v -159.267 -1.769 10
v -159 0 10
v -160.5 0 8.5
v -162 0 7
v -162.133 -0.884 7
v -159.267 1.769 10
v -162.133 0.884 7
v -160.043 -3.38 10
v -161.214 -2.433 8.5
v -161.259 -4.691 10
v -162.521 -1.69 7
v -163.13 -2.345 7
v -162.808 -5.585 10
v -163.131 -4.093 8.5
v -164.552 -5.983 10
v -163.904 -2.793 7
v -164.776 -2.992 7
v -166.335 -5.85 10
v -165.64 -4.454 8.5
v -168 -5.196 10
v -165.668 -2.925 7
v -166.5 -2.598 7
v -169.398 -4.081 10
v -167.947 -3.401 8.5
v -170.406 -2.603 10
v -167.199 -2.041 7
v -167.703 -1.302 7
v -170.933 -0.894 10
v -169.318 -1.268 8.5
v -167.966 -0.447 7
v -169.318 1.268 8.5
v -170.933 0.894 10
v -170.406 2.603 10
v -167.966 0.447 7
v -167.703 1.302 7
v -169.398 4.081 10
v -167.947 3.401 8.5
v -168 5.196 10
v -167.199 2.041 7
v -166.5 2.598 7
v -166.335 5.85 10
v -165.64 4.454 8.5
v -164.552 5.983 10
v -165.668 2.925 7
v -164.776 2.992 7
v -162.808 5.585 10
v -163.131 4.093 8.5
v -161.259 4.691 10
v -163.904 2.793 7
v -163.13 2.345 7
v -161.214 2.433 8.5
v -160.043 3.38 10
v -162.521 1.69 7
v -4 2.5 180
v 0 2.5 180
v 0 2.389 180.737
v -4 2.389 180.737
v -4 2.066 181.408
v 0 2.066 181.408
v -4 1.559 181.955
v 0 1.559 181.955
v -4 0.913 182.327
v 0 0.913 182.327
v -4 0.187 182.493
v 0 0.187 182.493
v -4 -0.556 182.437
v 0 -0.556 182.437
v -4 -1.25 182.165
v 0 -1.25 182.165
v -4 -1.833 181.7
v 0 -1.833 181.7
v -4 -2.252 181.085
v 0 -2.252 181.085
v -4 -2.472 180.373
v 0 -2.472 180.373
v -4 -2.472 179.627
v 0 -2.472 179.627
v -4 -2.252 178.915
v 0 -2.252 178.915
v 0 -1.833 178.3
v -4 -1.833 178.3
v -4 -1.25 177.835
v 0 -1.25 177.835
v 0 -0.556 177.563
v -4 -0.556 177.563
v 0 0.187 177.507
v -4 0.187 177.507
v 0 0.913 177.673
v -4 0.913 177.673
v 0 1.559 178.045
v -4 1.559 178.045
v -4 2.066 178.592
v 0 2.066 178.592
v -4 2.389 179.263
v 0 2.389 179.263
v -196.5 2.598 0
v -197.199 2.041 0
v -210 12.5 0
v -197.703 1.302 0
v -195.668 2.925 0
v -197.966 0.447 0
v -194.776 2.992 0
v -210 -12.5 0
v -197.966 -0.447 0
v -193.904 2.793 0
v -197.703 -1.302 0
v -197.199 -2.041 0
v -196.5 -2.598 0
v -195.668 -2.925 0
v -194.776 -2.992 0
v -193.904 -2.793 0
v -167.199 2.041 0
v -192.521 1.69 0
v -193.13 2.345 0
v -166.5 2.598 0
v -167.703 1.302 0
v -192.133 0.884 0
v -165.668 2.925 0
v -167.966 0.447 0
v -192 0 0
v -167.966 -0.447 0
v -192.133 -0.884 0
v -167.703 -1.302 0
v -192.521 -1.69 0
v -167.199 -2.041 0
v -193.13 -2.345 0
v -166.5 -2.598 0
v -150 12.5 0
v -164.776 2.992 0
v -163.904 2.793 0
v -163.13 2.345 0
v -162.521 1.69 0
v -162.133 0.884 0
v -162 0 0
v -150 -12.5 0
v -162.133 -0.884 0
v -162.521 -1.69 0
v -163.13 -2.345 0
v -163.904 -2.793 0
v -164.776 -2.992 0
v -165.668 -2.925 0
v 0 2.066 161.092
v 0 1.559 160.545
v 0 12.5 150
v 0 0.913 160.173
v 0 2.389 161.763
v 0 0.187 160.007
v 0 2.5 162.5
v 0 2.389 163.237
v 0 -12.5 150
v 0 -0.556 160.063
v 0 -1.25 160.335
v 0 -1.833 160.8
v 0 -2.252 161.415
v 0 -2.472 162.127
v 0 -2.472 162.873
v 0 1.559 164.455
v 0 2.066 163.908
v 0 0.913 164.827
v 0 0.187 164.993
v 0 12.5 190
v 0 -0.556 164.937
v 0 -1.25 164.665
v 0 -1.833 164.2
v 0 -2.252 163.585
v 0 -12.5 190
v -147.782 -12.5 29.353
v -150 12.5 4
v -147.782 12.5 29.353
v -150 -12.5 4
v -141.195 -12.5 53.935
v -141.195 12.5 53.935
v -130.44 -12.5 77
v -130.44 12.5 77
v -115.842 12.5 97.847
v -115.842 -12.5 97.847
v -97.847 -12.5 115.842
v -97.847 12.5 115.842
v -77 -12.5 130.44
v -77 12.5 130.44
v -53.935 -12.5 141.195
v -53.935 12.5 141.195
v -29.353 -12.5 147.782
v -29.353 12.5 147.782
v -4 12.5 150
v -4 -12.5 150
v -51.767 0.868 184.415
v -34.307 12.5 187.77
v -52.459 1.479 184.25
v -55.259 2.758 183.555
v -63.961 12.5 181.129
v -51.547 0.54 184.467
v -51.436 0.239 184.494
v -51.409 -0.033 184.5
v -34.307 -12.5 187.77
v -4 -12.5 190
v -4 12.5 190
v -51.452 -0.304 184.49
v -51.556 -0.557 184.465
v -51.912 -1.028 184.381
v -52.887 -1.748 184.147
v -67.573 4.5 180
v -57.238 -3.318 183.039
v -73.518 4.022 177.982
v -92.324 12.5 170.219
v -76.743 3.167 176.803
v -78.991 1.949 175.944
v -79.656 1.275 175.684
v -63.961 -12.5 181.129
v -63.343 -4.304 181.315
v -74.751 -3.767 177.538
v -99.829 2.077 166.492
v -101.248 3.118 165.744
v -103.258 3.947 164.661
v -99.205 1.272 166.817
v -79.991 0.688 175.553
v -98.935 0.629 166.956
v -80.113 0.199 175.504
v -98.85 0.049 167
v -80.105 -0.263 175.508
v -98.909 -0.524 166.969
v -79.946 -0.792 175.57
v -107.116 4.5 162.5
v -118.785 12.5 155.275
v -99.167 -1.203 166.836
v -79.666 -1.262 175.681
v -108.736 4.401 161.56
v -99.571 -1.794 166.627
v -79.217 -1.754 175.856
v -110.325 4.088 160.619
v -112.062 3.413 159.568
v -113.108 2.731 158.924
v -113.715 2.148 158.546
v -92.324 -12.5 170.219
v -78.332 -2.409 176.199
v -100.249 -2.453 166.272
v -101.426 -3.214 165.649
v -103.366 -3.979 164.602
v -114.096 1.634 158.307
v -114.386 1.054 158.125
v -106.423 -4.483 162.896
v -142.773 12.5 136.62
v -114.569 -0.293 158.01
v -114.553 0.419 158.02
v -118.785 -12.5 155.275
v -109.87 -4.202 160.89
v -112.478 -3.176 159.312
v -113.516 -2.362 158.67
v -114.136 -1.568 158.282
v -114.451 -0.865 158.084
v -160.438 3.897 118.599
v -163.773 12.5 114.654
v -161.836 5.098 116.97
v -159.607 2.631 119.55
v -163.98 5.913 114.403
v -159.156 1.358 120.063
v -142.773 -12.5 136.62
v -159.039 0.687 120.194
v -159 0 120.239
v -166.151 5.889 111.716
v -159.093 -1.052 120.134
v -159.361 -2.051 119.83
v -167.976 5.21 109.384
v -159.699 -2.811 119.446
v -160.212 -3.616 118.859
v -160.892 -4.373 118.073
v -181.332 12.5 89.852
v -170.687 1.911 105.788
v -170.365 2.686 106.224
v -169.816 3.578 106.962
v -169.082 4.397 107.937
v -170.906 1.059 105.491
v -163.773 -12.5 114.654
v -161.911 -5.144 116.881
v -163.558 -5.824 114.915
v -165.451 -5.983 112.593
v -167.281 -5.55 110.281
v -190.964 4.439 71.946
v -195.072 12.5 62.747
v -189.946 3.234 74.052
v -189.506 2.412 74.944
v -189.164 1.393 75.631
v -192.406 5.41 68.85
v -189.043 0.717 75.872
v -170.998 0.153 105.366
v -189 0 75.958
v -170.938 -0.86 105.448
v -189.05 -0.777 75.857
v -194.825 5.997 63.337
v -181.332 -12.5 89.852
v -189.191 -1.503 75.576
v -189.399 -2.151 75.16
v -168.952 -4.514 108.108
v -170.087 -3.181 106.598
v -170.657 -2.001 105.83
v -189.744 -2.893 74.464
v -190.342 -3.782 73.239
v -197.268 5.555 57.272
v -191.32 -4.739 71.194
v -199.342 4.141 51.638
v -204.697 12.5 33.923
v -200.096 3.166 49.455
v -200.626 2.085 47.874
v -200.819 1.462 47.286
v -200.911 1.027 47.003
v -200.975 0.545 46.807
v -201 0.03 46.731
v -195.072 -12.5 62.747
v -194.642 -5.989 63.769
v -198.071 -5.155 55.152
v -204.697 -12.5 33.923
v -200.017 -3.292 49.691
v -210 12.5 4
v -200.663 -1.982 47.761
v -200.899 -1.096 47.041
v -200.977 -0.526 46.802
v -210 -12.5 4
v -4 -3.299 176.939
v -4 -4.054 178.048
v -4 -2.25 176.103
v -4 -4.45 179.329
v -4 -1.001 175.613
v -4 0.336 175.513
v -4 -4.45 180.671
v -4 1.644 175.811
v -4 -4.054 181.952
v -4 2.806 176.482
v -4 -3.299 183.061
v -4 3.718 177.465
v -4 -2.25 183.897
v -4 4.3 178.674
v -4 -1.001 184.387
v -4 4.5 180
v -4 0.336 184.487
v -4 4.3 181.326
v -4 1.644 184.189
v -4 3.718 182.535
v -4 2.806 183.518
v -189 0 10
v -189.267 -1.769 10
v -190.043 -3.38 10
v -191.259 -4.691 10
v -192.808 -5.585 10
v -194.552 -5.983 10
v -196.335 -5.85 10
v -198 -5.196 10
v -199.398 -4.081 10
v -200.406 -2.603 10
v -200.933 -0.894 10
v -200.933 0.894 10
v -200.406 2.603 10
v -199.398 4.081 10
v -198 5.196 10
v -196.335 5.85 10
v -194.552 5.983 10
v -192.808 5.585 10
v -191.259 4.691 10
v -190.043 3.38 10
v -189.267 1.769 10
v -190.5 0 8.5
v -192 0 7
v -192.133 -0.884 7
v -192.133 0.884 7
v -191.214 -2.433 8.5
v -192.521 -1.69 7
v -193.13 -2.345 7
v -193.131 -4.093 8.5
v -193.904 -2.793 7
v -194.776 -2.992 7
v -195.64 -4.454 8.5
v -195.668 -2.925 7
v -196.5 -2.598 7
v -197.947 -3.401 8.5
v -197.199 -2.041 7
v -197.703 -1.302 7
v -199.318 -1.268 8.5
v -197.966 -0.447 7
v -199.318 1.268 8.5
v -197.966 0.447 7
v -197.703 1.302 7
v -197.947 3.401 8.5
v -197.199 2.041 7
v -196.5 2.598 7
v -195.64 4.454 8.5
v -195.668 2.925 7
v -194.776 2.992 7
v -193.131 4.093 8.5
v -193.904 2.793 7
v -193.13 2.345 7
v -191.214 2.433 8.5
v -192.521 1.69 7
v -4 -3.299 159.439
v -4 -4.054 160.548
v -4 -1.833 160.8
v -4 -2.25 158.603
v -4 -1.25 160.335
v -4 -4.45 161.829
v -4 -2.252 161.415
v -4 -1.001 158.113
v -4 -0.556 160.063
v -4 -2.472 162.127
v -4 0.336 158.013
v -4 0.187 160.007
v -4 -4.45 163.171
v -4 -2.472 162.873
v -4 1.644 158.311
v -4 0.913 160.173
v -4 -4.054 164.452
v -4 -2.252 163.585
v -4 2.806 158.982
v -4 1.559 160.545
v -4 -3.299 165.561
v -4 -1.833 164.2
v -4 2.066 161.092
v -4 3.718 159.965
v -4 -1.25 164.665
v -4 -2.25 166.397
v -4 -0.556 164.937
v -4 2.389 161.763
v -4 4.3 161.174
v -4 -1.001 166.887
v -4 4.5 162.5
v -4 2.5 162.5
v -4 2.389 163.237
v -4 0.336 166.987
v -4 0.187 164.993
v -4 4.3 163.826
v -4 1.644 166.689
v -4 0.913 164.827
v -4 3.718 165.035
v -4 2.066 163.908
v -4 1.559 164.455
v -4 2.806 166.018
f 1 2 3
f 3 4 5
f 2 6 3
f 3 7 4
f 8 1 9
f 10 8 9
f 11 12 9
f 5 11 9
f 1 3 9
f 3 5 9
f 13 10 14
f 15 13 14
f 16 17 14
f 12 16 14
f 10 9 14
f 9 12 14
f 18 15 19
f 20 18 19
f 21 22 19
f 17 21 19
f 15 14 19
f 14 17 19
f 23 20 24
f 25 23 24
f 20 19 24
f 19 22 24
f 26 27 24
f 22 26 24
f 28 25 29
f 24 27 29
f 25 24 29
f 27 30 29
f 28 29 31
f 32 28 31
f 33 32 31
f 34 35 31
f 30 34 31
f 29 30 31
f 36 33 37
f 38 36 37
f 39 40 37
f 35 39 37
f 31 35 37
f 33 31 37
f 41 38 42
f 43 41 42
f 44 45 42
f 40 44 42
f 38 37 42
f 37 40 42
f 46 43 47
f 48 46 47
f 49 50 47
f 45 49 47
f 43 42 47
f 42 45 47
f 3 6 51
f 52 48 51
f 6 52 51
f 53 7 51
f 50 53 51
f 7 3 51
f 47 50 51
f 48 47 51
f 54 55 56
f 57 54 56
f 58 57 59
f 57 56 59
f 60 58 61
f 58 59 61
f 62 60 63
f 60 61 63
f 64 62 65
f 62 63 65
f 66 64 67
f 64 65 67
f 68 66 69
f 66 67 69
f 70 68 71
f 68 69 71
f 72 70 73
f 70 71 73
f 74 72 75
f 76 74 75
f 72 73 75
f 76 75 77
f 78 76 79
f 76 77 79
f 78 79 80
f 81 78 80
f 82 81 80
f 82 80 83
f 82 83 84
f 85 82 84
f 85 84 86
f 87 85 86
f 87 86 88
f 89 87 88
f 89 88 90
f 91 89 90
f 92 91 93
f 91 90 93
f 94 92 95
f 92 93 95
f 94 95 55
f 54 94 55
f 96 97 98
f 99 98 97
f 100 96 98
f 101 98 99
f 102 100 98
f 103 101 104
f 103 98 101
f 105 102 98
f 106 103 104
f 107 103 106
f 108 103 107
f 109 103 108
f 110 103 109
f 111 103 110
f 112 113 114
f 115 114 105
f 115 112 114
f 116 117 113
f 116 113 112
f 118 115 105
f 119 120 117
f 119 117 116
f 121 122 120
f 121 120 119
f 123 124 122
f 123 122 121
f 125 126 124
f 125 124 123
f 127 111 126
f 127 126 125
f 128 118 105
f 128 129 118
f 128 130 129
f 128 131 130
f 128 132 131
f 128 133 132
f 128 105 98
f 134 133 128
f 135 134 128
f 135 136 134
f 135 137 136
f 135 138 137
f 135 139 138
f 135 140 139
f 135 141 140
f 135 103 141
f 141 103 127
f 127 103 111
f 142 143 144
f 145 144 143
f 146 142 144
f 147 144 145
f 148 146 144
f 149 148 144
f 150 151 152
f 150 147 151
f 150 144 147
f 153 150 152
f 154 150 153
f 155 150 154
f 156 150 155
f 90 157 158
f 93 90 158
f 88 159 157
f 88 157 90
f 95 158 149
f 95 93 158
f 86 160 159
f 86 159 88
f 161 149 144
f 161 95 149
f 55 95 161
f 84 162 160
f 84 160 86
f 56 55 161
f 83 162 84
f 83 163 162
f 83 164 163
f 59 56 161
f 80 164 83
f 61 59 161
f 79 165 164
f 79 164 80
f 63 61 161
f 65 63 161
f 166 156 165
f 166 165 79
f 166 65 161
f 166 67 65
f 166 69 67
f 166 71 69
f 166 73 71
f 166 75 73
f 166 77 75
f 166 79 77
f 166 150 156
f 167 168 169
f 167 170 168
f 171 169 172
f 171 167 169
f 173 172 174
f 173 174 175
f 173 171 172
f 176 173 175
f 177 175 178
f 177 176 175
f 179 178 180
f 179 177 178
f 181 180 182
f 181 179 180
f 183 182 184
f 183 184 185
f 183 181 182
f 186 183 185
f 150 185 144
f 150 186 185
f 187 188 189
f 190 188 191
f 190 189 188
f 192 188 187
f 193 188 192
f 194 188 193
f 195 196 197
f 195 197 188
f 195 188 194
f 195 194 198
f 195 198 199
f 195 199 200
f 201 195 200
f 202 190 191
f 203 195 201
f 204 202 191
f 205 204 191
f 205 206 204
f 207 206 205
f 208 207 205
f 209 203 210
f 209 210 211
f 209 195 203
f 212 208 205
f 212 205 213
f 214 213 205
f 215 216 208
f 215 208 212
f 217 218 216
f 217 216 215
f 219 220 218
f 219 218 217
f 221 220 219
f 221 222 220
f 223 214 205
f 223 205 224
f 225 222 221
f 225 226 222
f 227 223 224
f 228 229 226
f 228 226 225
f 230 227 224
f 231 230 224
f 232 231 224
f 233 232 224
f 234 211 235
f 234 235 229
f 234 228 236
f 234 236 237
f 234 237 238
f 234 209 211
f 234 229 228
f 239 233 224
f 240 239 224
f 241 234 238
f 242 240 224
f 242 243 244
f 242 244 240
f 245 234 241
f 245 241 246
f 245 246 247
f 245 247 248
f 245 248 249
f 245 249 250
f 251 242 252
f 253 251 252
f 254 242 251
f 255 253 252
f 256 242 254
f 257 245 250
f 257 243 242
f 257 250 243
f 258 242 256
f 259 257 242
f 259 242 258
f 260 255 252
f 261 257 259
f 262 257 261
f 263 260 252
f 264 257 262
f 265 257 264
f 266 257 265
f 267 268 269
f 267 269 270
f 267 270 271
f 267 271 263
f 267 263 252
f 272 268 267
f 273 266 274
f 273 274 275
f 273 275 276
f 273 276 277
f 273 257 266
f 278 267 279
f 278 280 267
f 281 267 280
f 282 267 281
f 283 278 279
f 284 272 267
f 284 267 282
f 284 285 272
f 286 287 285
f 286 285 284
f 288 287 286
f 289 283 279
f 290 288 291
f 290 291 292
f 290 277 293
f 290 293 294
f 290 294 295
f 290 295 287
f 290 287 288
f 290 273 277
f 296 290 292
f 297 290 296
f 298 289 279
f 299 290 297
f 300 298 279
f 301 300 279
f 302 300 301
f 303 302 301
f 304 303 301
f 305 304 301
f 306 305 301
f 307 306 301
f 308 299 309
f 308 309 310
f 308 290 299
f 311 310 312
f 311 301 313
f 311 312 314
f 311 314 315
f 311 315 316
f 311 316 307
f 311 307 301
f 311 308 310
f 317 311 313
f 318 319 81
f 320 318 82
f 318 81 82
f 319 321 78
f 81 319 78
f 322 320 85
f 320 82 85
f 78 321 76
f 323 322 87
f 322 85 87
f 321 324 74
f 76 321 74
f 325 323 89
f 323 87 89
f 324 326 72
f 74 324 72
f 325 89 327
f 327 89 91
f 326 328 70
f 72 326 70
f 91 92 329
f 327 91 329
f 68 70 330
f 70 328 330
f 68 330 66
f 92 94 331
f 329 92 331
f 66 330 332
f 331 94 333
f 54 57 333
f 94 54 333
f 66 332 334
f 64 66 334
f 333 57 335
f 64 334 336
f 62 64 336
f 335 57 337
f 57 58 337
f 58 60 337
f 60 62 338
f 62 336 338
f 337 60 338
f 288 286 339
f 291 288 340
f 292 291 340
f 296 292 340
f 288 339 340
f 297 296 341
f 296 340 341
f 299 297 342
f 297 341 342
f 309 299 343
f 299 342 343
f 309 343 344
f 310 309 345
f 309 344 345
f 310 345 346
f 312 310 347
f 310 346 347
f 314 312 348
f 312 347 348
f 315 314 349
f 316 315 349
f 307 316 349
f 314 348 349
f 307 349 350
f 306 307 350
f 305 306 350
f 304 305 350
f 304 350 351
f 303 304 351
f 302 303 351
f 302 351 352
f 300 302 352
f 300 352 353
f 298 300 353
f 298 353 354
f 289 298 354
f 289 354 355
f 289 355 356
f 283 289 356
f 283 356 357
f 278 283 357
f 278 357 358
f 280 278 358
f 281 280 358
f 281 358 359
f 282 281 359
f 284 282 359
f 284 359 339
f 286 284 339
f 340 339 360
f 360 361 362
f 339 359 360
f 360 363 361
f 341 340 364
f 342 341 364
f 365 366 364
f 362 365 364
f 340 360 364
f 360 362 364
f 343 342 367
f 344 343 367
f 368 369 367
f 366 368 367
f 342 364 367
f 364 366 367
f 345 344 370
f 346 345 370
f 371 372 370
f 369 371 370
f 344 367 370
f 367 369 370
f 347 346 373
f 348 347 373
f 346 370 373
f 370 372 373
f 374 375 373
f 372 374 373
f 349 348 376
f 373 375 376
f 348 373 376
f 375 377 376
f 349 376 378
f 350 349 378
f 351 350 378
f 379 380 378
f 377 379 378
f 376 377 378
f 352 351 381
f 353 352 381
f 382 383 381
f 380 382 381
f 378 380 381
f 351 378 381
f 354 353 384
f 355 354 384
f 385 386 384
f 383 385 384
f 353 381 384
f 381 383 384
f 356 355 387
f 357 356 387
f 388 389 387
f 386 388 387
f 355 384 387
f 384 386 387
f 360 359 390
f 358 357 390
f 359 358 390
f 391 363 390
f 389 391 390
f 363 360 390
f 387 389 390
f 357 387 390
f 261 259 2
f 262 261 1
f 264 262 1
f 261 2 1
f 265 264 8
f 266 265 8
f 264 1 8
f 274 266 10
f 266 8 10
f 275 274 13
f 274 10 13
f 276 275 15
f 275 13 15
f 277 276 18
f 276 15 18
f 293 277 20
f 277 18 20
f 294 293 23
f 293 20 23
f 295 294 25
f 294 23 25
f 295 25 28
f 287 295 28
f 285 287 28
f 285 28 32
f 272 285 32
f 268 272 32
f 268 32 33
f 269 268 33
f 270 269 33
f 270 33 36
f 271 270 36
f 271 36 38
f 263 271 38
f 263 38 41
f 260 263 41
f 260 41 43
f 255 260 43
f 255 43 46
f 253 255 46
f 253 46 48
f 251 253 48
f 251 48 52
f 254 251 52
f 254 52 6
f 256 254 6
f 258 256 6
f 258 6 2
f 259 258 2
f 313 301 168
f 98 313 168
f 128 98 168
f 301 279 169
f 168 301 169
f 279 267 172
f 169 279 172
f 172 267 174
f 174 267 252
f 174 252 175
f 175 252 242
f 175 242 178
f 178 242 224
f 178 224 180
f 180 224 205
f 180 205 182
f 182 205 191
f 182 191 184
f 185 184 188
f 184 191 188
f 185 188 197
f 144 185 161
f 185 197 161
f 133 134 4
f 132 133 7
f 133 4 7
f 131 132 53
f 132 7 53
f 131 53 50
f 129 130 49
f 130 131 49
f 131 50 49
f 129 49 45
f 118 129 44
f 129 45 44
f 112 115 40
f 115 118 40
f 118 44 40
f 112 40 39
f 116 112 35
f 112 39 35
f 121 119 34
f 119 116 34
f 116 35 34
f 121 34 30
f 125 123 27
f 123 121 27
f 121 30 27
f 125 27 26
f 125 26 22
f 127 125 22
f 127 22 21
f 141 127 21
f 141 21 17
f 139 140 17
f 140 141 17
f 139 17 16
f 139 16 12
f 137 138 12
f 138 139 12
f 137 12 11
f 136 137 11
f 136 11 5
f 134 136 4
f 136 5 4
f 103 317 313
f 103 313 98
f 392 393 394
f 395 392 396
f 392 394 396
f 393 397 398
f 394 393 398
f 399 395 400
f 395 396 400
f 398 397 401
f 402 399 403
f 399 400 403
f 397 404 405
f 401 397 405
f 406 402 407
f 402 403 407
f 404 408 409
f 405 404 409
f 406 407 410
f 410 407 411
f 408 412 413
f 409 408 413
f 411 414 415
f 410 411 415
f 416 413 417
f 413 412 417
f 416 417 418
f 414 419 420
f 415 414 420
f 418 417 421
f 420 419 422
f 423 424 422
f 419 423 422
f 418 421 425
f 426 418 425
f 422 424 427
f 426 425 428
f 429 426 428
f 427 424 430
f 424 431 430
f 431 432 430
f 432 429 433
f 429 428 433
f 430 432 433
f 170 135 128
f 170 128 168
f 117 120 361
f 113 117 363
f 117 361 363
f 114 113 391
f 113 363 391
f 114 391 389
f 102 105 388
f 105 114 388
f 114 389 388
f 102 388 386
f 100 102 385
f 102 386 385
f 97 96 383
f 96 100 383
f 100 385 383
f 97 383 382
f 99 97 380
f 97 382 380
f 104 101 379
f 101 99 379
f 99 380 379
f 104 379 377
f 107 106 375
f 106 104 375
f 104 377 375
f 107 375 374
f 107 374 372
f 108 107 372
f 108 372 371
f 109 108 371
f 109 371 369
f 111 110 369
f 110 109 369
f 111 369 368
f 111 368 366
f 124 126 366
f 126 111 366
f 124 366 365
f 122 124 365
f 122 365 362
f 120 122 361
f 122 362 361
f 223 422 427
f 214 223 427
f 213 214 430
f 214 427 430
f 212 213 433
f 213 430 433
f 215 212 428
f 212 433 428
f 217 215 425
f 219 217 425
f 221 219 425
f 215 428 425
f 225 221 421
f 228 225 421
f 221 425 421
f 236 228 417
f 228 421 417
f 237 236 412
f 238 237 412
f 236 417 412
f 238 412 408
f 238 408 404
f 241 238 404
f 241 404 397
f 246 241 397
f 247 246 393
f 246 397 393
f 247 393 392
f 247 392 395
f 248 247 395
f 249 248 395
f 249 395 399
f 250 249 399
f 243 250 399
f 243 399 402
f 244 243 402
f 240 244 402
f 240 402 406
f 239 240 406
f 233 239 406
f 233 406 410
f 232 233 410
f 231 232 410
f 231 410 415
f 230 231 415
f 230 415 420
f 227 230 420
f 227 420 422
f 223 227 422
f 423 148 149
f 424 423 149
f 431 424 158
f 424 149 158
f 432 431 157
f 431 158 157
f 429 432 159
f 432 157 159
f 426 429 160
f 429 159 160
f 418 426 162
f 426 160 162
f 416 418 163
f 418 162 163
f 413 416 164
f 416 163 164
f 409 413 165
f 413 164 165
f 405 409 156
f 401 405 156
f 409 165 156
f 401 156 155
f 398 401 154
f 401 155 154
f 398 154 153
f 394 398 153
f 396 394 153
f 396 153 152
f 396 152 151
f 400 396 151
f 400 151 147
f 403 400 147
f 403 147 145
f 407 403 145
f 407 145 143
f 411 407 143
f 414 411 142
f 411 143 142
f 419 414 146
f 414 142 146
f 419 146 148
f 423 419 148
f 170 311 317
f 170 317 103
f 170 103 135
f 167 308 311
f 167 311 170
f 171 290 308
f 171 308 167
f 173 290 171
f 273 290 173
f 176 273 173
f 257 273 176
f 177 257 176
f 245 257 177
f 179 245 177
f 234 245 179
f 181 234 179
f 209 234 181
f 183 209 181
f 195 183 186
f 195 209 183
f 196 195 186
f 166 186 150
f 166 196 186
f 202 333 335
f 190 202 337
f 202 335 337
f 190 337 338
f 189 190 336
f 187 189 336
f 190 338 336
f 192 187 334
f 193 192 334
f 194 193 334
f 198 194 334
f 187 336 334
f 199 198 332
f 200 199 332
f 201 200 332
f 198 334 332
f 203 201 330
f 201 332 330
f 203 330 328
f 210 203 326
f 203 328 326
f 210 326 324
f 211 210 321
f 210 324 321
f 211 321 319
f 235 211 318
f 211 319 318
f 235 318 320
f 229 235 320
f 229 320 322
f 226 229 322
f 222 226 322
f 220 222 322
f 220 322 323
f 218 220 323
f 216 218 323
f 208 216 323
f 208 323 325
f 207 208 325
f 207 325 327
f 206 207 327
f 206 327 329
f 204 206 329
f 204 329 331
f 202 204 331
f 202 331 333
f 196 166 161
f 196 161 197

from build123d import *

# Parameters (mm, degrees)
F1_DEPTH      = 12.5
F2_R          = 2.5
F3_DEPTH      = 4
F4_R          = 4.5
F5_DEPTH      = 206.001
F6_R          = 3
F7_DEPTH      = 5
F8_R          = 6
F9_DEPTH      = 185.0010001
F10_S5_R      = 3
F10_T6_DEPTH  = 10
F10_S11_R     = 3
F10_T12_DEPTH = 10


# Not quite as in the source:
# - a fillet or chamfer that OpenCascade refuses, or shapes differently, is made with other operations: its cross-section is extruded or revolved along the edge and cut away or added


with BuildPart() as f1:
    # F0 (on Front) → F1 (new body, symmetric)
    with BuildSketch(Plane.XZ):
        with BuildLine():
            Line((0, 150), (0, 190))
            Line((0, 190), (-4, 190))
            ThreePointArc((-4, 190), (-142.7731962592, 136.6197765021), (-210, 4))
            Line((-210, 4), (-210, 0))
            Line((-210, 0), (-150, 0))
            Line((-150, 0), (-150, 4))
            ThreePointArc((-150, 4), (-107.2375900532, 107.2375900532), (-4, 150))
            Line((-4, 150), (0, 150))
        make_face()
    extrude(amount=F1_DEPTH, both=True)

    # F2 (on face) → F3 (cut)
    with BuildSketch(Plane.YZ):
        with Locations((0, 180)):
            Circle(F2_R)
        with Locations((0, 162.5)):
            Circle(F2_R)
    extrude(amount=-F3_DEPTH, mode=Mode.SUBTRACT)

    # F4 (on face) → F5 (cut, through all)
    with BuildSketch(Plane.YZ.offset(-4)):
        with Locations((0, 180)):
            Circle(F4_R)
        with Locations((0, 162.5)):
            Circle(F4_R)
    extrude(amount=-F5_DEPTH, mode=Mode.SUBTRACT)

    # F6 (on face) → F7 (cut)
    with BuildSketch(Plane(origin=(0, 0, 0), x_dir=(1, 0, 0), z_dir=(0, 0, -1))):
        with Locations((-165, 0)):
            Circle(F6_R)
        with Locations((-195, 0)):
            Circle(F6_R)
    extrude(amount=-F7_DEPTH, mode=Mode.SUBTRACT)

    # F8 (on face) → F9 (cut, through all)
    with BuildSketch(Plane(origin=(0, 0, 5), x_dir=(1, 0, 0), z_dir=(0, 0, -1))):
        with Locations((-165, 0)):
            Circle(F8_R)
        with Locations((-195, 0)):
            Circle(F8_R)
    extrude(amount=-F9_DEPTH, mode=Mode.SUBTRACT)

    # F10: chamfer of 5 on 2 edges, made by hand


with BuildPart() as f10_tool2:
    # F10_s3 → F10_t4 (revolve)
    with BuildSketch(Plane.XZ):
        Polygon((-189, 10), (-194, 5), (-189, 5), align=None)
    revolve(axis=Axis((-195, 0, 5), (0, 0, -1)))

    # F10_s5 → F10_t6 (cut, symmetric)
    with BuildSketch(Plane.XY.offset(7.5)):
        with Locations((-195, 0)):
            Circle(F10_S5_R)
    extrude(amount=F10_T6_DEPTH, both=True, mode=Mode.SUBTRACT)


with BuildPart() as f1_1:
    add(f1.part)

    # F10_t1: union F10_tool2
    add(f10_tool2.part)


with BuildPart() as f10_tool8:
    # F10_s9 → F10_t10 (revolve)
    with BuildSketch(Plane.XZ):
        Polygon((-159, 10), (-164, 5), (-159, 5), align=None)
    revolve(axis=Axis((-165, 0, 5), (0, 0, -1)))

    # F10_s11 → F10_t12 (cut, symmetric)
    with BuildSketch(Plane.XY.offset(7.5)):
        with Locations((-165, 0)):
            Circle(F10_S11_R)
    extrude(amount=F10_T12_DEPTH, both=True, mode=Mode.SUBTRACT)


with BuildPart() as f1_2:
    add(f1_1.part)

    # F10_t7: union F10_tool8
    add(f10_tool8.part)


solid = f1_2.part
